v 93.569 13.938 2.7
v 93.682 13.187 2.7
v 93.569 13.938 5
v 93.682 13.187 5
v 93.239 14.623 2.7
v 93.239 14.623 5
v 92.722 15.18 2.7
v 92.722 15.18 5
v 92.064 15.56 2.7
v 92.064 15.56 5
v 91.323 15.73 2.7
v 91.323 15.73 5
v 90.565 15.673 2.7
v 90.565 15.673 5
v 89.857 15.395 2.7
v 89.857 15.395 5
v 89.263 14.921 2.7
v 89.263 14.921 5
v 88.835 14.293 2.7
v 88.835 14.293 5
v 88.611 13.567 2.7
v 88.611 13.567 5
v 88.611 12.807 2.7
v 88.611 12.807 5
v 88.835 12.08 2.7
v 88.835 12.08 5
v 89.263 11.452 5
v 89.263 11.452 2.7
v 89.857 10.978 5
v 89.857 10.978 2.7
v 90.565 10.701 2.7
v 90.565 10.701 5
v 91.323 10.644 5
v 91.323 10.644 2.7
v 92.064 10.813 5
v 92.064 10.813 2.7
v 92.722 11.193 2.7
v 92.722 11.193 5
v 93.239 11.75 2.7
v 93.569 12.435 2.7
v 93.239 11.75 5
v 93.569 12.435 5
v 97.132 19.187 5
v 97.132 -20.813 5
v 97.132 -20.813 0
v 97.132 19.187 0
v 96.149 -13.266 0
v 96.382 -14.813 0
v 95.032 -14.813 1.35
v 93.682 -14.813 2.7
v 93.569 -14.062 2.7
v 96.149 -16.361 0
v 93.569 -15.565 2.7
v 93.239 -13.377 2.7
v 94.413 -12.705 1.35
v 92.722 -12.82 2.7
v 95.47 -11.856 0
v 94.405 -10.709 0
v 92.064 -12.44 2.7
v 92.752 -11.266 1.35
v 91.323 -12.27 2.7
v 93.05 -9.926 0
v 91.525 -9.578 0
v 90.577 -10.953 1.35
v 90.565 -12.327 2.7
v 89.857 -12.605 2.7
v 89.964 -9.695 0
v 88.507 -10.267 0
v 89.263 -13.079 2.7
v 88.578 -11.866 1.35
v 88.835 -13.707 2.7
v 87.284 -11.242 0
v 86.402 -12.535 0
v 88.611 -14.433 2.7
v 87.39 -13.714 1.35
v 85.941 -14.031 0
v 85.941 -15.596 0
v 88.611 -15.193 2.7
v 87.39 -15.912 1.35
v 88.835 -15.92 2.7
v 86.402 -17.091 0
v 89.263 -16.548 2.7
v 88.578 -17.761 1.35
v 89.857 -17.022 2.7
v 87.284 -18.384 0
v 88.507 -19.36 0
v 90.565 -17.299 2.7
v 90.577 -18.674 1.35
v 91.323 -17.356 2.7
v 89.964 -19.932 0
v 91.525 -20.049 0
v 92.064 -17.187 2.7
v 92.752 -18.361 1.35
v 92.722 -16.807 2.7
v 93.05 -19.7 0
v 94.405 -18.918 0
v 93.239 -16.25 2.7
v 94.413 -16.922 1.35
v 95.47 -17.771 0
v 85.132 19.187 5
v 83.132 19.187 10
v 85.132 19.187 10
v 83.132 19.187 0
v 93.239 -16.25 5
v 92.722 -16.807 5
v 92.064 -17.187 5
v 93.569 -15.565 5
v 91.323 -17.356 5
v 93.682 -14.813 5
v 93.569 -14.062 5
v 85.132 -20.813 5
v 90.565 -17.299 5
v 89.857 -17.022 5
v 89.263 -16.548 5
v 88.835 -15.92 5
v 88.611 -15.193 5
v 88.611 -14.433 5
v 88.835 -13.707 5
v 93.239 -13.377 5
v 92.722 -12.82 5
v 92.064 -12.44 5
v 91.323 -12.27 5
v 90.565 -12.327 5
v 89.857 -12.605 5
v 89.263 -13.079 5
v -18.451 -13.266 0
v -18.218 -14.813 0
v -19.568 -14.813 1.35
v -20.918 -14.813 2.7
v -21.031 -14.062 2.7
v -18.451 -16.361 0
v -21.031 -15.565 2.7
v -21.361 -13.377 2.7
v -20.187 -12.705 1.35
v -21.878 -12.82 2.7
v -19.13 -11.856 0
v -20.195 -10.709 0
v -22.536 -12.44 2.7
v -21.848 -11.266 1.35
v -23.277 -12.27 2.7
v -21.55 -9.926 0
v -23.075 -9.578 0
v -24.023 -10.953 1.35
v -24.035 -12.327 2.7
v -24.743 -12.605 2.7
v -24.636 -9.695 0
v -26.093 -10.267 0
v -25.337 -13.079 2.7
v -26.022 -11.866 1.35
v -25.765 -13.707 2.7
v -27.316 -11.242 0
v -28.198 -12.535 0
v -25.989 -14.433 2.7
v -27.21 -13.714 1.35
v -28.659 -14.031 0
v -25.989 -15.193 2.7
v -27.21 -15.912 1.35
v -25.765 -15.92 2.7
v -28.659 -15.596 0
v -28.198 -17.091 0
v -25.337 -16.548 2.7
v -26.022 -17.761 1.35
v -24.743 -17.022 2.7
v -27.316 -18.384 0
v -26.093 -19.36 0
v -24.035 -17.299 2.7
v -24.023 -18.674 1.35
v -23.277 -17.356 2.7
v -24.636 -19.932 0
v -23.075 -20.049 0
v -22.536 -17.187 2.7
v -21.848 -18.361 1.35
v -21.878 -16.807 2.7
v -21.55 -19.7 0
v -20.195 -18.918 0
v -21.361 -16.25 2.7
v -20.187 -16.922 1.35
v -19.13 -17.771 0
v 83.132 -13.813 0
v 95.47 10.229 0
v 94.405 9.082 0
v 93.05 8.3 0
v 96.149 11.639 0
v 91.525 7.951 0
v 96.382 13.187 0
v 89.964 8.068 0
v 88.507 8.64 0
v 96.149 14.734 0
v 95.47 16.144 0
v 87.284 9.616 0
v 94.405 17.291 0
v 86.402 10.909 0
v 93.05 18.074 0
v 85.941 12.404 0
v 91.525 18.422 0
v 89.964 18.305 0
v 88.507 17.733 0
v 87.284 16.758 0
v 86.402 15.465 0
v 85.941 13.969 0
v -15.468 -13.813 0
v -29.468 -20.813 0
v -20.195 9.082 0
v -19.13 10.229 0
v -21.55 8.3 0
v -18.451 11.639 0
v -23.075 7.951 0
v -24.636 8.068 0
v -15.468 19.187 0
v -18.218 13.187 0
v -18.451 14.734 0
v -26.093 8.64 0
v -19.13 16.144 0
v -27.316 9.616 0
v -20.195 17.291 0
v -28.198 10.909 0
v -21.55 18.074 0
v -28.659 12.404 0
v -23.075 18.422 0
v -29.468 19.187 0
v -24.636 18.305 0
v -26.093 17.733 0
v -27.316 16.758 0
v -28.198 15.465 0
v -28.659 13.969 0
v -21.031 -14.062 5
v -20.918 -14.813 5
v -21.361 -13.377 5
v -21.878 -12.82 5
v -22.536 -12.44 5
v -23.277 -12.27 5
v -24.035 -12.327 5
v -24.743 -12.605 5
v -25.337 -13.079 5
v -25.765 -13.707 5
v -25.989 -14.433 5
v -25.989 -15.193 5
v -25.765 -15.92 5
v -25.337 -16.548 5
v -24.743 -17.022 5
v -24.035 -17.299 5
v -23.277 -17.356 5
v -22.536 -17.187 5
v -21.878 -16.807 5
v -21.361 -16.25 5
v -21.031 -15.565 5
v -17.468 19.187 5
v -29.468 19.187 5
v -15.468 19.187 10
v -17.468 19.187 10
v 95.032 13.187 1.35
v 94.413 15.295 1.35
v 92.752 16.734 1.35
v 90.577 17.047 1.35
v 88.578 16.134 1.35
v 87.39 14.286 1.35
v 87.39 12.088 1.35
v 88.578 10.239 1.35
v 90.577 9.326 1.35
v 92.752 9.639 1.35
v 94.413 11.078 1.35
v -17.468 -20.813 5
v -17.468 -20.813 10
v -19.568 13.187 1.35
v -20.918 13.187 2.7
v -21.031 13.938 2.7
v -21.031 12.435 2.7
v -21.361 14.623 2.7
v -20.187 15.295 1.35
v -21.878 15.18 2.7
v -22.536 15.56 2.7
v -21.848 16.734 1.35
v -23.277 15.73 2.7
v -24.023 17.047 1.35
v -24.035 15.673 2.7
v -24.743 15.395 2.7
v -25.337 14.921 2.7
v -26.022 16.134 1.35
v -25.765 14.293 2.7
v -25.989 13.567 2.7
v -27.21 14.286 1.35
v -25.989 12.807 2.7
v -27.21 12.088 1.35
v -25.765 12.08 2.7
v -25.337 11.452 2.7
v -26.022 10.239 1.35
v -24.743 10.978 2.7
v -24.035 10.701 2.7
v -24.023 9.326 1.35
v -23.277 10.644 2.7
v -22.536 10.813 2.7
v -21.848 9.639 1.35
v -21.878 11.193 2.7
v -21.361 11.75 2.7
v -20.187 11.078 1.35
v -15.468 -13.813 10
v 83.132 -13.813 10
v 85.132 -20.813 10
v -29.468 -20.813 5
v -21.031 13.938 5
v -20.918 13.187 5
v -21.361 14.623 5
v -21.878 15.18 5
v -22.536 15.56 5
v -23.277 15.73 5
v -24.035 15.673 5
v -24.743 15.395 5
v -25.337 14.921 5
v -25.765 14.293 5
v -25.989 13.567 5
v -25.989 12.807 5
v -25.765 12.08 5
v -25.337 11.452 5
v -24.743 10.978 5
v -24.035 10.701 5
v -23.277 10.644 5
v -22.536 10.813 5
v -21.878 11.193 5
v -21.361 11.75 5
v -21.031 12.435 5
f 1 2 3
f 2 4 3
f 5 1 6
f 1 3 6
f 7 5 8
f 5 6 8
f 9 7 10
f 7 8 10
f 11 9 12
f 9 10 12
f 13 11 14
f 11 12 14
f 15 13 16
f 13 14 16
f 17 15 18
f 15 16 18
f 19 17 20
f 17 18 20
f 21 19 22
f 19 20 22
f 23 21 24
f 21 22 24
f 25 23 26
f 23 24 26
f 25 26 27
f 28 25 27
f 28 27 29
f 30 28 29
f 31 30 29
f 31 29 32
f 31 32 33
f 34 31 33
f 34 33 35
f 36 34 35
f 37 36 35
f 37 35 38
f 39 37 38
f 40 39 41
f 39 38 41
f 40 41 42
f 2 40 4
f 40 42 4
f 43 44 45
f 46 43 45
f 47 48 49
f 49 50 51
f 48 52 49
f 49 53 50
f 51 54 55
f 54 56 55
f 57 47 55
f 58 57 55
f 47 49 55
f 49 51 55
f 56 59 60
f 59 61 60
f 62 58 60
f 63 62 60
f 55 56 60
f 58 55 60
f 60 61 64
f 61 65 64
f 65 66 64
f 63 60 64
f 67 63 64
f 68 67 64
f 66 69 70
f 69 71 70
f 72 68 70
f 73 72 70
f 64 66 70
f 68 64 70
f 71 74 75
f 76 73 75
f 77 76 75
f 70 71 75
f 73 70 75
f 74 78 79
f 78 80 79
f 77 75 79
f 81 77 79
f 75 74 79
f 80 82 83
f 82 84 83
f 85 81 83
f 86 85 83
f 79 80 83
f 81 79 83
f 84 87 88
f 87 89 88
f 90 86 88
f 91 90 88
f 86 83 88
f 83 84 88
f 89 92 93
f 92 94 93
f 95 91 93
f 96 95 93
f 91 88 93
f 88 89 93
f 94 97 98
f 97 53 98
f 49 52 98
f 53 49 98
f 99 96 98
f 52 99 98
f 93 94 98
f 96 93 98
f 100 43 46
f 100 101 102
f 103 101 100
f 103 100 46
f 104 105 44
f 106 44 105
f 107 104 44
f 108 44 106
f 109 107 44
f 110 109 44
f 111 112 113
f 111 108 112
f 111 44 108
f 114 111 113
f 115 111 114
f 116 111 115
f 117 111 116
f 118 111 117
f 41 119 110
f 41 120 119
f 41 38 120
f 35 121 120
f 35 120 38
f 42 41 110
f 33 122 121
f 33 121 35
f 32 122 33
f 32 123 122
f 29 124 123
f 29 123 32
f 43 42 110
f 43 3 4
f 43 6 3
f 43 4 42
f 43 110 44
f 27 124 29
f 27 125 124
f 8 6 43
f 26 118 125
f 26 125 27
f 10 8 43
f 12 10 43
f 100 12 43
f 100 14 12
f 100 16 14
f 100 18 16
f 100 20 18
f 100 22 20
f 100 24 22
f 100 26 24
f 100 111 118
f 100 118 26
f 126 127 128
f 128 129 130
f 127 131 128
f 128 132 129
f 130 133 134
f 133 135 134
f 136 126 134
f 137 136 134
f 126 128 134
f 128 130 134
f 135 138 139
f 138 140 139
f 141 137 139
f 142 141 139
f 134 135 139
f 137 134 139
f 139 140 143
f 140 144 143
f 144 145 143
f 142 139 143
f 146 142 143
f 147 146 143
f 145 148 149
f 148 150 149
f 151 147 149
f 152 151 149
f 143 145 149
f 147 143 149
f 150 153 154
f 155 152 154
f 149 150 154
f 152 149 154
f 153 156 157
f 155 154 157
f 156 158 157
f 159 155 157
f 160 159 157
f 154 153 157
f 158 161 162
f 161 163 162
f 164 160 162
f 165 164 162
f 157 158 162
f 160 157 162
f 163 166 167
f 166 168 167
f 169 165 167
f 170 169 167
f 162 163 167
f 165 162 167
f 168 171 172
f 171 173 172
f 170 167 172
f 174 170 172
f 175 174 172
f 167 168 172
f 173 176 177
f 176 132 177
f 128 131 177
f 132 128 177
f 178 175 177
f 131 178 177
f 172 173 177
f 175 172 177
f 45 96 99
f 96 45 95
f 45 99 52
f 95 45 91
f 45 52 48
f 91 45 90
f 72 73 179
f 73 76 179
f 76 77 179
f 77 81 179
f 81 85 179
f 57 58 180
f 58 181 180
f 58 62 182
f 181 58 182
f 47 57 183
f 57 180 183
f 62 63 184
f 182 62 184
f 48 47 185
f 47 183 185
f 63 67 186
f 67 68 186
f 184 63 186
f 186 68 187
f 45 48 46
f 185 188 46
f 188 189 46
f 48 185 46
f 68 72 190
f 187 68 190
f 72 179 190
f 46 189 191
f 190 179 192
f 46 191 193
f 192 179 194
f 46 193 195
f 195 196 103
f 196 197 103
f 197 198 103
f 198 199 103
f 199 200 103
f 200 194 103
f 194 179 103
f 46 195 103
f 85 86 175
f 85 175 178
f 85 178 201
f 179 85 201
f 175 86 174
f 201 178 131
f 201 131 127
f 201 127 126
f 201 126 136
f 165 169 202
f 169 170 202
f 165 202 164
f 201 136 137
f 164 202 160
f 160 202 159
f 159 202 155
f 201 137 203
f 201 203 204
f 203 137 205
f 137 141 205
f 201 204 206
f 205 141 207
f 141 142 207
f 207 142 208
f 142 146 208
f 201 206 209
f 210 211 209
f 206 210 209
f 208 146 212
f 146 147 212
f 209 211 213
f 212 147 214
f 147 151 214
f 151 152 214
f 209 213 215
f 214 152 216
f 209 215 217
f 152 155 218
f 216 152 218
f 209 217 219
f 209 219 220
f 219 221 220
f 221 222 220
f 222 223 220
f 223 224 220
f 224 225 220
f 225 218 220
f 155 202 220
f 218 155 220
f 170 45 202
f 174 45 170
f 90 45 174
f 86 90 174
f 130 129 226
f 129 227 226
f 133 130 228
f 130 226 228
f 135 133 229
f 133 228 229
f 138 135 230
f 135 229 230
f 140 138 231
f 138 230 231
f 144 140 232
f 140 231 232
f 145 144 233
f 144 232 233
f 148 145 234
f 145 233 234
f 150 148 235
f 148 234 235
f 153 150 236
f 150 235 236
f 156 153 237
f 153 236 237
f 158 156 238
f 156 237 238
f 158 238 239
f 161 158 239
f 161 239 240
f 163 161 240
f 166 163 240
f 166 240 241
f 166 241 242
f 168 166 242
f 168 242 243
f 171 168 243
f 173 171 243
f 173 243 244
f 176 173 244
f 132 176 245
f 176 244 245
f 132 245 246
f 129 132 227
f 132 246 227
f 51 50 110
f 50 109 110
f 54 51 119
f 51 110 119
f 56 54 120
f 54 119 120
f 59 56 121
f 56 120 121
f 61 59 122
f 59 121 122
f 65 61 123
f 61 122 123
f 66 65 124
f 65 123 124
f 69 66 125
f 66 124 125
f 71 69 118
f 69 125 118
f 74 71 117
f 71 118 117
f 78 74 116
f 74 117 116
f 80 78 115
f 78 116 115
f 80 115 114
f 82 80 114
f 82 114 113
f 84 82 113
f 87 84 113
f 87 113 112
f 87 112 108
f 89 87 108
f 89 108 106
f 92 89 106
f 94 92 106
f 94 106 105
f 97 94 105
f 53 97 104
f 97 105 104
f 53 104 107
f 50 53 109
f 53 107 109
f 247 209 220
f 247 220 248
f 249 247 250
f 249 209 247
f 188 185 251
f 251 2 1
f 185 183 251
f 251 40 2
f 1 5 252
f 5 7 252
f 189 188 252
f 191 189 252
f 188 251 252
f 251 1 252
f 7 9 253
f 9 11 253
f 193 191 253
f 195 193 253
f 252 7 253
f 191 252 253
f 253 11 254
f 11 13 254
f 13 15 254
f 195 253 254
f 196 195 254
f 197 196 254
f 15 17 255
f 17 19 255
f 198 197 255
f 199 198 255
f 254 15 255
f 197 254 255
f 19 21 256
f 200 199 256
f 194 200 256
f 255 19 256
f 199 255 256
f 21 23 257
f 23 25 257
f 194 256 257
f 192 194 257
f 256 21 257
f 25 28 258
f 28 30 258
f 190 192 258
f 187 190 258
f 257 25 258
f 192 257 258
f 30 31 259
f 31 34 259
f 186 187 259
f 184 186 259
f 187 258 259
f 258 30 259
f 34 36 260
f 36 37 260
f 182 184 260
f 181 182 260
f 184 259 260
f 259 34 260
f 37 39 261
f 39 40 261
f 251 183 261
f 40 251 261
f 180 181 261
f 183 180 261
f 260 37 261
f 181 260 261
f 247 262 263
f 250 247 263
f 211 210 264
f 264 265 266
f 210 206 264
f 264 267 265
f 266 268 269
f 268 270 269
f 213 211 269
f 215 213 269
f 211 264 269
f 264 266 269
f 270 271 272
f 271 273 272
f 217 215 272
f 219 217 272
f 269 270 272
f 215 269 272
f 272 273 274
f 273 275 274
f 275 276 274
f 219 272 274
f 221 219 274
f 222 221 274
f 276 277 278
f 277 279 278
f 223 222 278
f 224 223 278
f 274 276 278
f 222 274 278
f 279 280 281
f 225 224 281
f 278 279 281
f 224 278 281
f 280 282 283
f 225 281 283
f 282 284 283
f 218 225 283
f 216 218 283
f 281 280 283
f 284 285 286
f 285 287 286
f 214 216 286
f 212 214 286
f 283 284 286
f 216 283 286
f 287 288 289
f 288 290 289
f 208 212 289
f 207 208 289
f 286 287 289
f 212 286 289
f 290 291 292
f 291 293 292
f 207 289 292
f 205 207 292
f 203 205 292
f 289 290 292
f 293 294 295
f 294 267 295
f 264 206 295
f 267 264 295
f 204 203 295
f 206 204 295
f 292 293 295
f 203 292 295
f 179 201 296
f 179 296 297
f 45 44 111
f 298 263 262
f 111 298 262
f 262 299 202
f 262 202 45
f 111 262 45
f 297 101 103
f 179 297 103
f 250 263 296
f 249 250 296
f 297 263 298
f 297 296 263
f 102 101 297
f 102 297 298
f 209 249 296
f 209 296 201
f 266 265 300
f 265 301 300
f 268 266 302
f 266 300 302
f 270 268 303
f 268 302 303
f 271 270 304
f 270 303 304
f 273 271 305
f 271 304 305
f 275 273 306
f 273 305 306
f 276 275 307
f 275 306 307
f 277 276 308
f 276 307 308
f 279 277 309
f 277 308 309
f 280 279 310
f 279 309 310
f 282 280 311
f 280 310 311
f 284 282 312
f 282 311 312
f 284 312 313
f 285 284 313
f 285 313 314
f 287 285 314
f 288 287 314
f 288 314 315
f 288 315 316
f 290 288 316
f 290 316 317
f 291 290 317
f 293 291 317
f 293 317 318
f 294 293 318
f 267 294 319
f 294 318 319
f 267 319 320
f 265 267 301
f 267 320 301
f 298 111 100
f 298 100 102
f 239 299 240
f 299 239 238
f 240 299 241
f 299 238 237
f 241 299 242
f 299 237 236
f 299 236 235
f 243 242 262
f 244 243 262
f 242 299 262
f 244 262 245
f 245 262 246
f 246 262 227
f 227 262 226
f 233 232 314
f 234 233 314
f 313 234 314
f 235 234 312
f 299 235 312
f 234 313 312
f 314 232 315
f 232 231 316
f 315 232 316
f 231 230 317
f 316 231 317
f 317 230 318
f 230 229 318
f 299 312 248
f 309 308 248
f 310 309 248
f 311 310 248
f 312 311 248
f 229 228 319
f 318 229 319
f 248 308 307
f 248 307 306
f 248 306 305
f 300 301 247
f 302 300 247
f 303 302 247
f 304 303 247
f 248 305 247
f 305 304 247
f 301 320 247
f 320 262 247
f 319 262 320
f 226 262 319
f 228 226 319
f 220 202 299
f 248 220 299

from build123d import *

# Parameters (mm, degrees)
BOSS_EXTRU_1_DEPTH                                = 10
BOSS_EXTRU_1_DEPTH_BACK                           = 0.0001
ESQUISSE1_W                                       = 102.6
ESQUISSE1_H                                       = 35
ESQUISSE4_W                                       = 98.6
ESQUISSE4_H                                       = 51.6
ENL_V_MAT_EXTRU_2_DEPTH                           = 33
ESQUISSE19_W                                      = 102.6
ESQUISSE19_H                                      = 10.0001
BOSS_EXTRU_4_DEPTH                                = 5
ESQUISSE21_W                                      = 5
ESQUISSE21_H                                      = 40
BOSS_EXTRU_5_DEPTH                                = 12
ESQUISSE22_W                                      = 5
ESQUISSE22_H                                      = 40
BOSS_EXTRU_6_DEPTH                                = 12
FRAISAGE_POUR_VIS_T_TE_FRAIS_E_BOMB_E_D           = 5.09999996
FRAISAGE_POUR_VIS_T_TE_FRAIS_E_BOMB_E_CSINK_D     = 10.500000082
FRAISAGE_POUR_VIS_T_TE_FRAIS_E_BOMB_E_CSINK_ANGLE = 90


with BuildPart() as part:
    # Esquisse1 → Boss.-Extru.1 (new, two sides: drawn at the far end of the back side and taken through both)
    with BuildSketch(Plane.XY.offset(-BOSS_EXTRU_1_DEPTH_BACK)):
        with Locations((33.832170394, 1.686746988)):
            Rectangle(ESQUISSE1_W, ESQUISSE1_H)
    extrude(amount=BOSS_EXTRU_1_DEPTH + BOSS_EXTRU_1_DEPTH_BACK)

    # Esquisse4 → Enlèv. mat.-Extru.2 (cut)
    with BuildSketch(Plane(origin=(0, 19.186746988, 0), x_dir=(1, 0, 0), z_dir=(0, 1, 0))):
        with Locations((33.832170394, -25.7999)):
            Rectangle(ESQUISSE4_W, ESQUISSE4_H)
    extrude(amount=-ENL_V_MAT_EXTRU_2_DEPTH, mode=Mode.SUBTRACT)

    # Esquisse19 → Boss.-Extru.4 (add)
    with BuildSketch(Plane.XZ.offset(15.813253012)):
        with Locations((33.832170394, 4.99995)):
            Rectangle(ESQUISSE19_W, ESQUISSE19_H)
    extrude(amount=BOSS_EXTRU_4_DEPTH)

    # Esquisse21 → Boss.-Extru.5 (add)
    with BuildSketch(Plane.ZY.offset(17.467829606)):
        with Locations((2.4999, -0.813253012)):
            Rectangle(ESQUISSE21_W, ESQUISSE21_H)
    extrude(amount=BOSS_EXTRU_5_DEPTH)

    # Esquisse22 → Boss.-Extru.6 (add)
    with BuildSketch(Plane(origin=(85.132170394, 0, 0), x_dir=(0, 0, -1), z_dir=(1, 0, 0))):
        with Locations((-2.4999, -0.813253012)):
            Rectangle(ESQUISSE22_W, ESQUISSE22_H)
    extrude(amount=BOSS_EXTRU_6_DEPTH)

    # Fraisage pour vis à tête fraisée bombée #51 (through all)
    with Locations(Plane(origin=(91.132170394, 13.186746988, -0.0001), x_dir=(-1, 0, 0), z_dir=(0, 0, -1))):
        with Locations((0, 0), (0, -28), (114.6, 0), (114.6, -28)):
            CounterSinkHole(FRAISAGE_POUR_VIS_T_TE_FRAIS_E_BOMB_E_D / 2, FRAISAGE_POUR_VIS_T_TE_FRAIS_E_BOMB_E_CSINK_D / 2, counter_sink_angle=FRAISAGE_POUR_VIS_T_TE_FRAIS_E_BOMB_E_CSINK_ANGLE)


solid = part.part
